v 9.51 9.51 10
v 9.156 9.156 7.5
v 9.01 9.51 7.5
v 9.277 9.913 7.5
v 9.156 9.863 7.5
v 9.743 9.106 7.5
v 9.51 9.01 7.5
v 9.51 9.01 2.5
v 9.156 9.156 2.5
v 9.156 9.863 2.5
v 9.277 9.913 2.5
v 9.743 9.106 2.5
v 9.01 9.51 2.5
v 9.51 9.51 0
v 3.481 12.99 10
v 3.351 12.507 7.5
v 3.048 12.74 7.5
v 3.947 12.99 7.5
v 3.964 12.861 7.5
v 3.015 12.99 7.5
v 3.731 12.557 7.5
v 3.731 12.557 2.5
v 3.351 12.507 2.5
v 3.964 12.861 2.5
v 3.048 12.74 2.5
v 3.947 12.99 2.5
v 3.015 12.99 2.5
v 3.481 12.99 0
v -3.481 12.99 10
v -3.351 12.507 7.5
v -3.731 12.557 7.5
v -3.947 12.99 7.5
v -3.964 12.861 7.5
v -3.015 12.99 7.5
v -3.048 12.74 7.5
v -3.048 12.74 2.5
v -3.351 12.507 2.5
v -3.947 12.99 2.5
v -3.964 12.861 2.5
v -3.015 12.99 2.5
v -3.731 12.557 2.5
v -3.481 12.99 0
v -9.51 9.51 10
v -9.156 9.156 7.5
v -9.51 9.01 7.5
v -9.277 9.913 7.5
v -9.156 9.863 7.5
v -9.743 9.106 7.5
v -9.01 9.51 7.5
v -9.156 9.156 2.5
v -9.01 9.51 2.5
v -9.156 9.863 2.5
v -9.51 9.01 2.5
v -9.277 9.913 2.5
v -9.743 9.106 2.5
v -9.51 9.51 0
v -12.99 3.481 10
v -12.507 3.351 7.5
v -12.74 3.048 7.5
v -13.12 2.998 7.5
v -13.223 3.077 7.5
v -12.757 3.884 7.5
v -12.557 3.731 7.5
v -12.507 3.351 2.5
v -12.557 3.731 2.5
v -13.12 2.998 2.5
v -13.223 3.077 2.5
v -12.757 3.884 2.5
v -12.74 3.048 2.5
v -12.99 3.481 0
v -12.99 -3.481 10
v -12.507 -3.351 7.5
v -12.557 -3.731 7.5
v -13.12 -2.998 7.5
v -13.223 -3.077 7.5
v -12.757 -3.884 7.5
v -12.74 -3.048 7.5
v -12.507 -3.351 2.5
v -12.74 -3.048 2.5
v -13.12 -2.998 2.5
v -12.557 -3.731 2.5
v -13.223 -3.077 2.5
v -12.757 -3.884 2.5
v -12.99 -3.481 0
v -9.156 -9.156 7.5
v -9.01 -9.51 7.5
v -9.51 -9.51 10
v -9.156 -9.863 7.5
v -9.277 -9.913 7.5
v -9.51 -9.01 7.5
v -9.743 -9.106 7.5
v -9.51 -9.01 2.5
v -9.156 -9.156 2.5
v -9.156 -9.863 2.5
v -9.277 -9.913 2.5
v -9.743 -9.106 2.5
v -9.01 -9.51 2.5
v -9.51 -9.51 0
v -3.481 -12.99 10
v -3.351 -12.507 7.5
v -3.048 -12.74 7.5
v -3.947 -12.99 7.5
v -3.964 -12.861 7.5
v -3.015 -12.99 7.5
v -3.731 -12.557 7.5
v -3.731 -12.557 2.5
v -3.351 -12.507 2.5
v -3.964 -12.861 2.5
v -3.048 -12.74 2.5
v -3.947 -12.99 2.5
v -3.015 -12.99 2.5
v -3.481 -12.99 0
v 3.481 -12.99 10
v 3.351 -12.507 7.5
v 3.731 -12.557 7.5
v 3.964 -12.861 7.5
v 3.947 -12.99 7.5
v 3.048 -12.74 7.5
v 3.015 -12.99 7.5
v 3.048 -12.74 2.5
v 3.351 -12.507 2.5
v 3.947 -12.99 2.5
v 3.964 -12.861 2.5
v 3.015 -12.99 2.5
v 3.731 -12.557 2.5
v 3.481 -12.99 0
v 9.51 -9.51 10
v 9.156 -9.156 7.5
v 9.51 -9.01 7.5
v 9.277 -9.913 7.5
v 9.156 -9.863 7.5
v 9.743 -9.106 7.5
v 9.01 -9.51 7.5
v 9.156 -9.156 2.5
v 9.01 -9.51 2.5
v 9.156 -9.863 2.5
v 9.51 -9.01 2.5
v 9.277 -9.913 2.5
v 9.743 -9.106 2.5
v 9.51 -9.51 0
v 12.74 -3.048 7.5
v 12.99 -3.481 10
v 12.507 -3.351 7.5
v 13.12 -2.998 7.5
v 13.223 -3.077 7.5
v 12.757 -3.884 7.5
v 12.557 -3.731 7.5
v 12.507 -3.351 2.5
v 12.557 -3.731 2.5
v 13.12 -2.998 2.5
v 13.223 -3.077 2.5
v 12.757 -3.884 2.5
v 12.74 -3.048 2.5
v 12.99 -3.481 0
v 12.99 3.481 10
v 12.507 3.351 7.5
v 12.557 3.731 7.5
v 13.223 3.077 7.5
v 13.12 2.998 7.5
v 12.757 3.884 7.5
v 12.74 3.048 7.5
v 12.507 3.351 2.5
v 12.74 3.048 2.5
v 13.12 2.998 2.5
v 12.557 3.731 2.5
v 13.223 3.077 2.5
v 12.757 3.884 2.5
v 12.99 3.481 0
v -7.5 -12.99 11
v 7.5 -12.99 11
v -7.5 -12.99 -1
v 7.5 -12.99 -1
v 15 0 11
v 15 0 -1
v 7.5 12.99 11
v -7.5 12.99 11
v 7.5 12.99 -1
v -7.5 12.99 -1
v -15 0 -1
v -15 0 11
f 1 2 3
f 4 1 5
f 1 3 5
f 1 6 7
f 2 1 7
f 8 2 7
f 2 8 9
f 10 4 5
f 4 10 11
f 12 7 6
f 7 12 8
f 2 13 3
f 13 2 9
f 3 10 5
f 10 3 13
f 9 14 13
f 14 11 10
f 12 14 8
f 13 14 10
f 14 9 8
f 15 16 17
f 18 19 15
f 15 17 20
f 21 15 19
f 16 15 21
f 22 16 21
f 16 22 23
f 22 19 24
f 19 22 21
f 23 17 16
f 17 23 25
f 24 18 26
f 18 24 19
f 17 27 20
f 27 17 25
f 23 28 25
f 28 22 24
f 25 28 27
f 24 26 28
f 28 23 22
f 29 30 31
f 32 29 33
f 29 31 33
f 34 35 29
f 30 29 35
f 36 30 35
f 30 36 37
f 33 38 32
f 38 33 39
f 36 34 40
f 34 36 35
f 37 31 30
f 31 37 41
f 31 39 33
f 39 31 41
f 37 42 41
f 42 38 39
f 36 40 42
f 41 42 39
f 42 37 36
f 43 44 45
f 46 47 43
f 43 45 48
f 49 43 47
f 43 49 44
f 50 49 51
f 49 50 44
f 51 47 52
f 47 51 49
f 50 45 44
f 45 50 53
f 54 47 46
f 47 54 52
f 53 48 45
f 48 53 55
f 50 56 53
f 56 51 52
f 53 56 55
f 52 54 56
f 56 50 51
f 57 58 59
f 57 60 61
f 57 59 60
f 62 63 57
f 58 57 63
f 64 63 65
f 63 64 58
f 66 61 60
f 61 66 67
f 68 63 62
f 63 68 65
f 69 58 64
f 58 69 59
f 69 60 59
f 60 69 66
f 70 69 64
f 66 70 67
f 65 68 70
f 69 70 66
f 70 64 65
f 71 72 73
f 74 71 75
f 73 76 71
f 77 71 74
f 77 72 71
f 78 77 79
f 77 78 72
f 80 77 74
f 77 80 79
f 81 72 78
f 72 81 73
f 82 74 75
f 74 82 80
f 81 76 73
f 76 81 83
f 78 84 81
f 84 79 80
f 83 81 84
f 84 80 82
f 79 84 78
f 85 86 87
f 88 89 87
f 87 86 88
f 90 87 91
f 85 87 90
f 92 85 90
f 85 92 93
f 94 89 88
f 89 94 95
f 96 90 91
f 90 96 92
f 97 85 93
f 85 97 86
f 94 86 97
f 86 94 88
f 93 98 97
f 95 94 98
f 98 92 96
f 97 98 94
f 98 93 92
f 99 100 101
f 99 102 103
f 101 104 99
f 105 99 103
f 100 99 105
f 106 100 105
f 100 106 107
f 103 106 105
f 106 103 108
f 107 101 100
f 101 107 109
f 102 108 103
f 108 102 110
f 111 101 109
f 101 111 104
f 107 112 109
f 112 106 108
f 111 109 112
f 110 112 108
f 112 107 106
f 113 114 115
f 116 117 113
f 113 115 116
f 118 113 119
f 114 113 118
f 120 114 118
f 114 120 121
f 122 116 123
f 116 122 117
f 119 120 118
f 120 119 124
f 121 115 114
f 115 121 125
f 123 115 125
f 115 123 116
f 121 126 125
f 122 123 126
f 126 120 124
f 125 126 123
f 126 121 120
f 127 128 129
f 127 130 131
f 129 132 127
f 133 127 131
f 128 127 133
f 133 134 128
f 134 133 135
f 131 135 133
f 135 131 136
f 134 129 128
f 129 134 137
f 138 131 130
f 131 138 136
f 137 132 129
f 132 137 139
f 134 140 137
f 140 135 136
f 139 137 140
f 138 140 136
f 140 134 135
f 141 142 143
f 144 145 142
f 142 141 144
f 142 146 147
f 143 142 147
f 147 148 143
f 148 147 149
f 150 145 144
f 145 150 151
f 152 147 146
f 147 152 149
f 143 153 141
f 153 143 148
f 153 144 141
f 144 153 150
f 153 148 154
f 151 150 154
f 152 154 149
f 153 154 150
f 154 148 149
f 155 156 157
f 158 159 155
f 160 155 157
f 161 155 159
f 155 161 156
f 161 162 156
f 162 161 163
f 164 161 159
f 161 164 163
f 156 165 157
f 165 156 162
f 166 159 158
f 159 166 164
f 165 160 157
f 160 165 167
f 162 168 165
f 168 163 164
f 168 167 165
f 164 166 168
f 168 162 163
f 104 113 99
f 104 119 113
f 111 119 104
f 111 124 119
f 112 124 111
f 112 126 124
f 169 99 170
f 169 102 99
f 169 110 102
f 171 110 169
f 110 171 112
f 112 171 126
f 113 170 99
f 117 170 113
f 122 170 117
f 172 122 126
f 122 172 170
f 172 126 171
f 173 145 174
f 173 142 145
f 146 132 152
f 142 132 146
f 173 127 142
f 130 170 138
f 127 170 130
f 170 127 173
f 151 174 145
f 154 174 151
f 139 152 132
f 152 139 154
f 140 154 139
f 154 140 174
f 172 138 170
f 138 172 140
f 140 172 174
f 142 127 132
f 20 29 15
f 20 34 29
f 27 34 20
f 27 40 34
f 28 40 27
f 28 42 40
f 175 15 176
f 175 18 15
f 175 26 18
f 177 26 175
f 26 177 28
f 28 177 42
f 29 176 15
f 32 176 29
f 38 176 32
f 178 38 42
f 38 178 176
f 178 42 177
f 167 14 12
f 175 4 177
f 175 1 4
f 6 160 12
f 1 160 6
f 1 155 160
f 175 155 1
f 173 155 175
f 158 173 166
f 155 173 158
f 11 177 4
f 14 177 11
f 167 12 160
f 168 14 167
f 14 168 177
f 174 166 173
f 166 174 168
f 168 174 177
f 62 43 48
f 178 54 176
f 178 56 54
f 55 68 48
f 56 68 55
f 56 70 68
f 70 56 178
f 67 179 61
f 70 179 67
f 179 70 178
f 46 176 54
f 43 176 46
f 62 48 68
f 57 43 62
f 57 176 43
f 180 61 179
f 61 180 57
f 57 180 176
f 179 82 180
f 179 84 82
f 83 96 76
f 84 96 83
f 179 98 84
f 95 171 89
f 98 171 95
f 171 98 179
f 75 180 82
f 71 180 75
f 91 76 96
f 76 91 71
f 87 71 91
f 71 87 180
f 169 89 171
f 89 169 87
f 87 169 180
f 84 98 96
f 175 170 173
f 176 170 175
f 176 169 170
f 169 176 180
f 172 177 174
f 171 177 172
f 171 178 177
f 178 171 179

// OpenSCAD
// file: bearing_race_spline.scad
bearing_race_spline();

module bearing_race_spline(
    h = 10, 
    r = 1,
    taper = 2.5)
{
    cylinder_height = h - (taper * 2);
    
    translate([0,0,taper + cylinder_height])
    cylinder(h = taper, r1 = r, r2 = 0);
    
    translate([0,0,taper])
    cylinder(h = cylinder_height, r = r);
    
    cylinder(h = taper, r1 = 0, r2 = r);
}
// main file
use <bearing_race_spline.scad>;

polygon_captive_hole(d = 30);

module polygon_captive_hole(
    sides = 6,
    h = 10, 
    r = undef,
    d = undef,    
    flat_r = undef,  
    flat_d = undef,
    spline_qty = 12,
    spline_depth = 0.5,
    extra_margin_bottom = 1,
    extra_margin_top = 1)
{
    sides_arc = (360 / sides);
    sides_half_arc = sides_arc / 2;
    splines_arc = (360 / spline_qty);
    splines_half_arc = splines_arc / 2;

    function r() = radius(r, d, flat_r, flat_d, sides);
    function d() = diameter(r, d, flat_r, flat_d, sides);
    function flat_r() = flat_radius(r, d, flat_r, flat_d, sides);
    function flat_d() = flat_diameter(r, d, flat_r, flat_d, sides);
    
    difference()
    {
        translate([0, 0, -extra_margin_bottom])
        cylinder(
            r = r(), 
            h = h + extra_margin_bottom + extra_margin_top, 
            $fn = sides);
            
        splines();
    }
    
    module splines()
    {        
        for (i = [1 : spline_qty])
        {
            angle = (i * splines_arc) + splines_half_arc;
            _spline(angle);
        }

        module _spline(angle)
        {
            half_arc_intersecting_radius = flat_r();
            right_triangle_angle = abs(sides_half_arc - (angle % sides_arc));
            
            distance_from_center = (right_triangle_angle)
                ? half_arc_intersecting_radius / cos(right_triangle_angle)
                : half_arc_intersecting_radius;

            rotate([0, 0, angle])
            translate([distance_from_center, 0, 0])
            bearing_race_spline(
                h = h, 
                r = spline_depth, 
                taper = h / 4, 
                $fn = 8);
        }
    }
}

function radius(r, d, fr, fd, sides) = 
    (r)  ? r : 
    (d)  ? radius_from_diameter(d) : 
    (fr) ? radius_from_flat_radius(fr, sides) : 
    (fd) ? radius_from_flat_diameter(fd, sides) : 
    undef;

function diameter(r, d, fr, fd, sides) = 
    (r)  ? diameter_from_radius(r) :
    (d)  ? d :
    (fr) ? diameter_from_flat_radius(fr, sides) :
    (fd) ? diameter_from_flat_diameter(fd, sides) :
    undef;

function flat_radius(r, d, fr, fd, sides) = 
    (r)  ? flat_radius_from_radius(r, sides) :
    (d)  ? flat_radius_from_diameter(d, sides) :
    (fr) ? fr :
    (fd) ? flat_radius_from_flat_diameter(fd) :
    undef;

function flat_diameter(r, d, fr, fd, sides) = 
    (r)  ? flat_diameter_from_radius(r, sides) :
    (d)  ? flat_diameter_from_diameter(d, sides) :
    (fr) ? flat_diameter_from_flat_radius(fr) :
    (fd) ? fd :     
    undef;

function radius_from_diameter(d) = d / 2;
function radius_from_flat_radius(fr, sides) = fr / cos(360 / sides / 2);
function radius_from_flat_diameter(fd, sides) = radius_from_flat_radius(fd / 2, sides);

function diameter_from_radius(r) = r * 2;
function diameter_from_flat_radius(fr, sides) = radius_from_flat_radius(fr, sides) * 2;
function diameter_from_flat_diameter(fd, sides) = radius_from_flat_radius(fd / 2, sides) * 2; 

function flat_radius_from_flat_diameter(fd) = fd / 2;
function flat_radius_from_radius(r, sides) = cos(360 / sides / 2) * r;
function flat_radius_from_diameter(d, sides) = flat_radius_from_radius(d / 2, sides);

function flat_diameter_from_flat_radius(fr) = fr * 2;
function flat_diameter_from_radius(r, sides) = flat_radius_from_radius(r, sides) * 2;
function flat_diameter_from_diameter(d, sides) = flat_radius_from_radius(d / 2, sides) * 2;
